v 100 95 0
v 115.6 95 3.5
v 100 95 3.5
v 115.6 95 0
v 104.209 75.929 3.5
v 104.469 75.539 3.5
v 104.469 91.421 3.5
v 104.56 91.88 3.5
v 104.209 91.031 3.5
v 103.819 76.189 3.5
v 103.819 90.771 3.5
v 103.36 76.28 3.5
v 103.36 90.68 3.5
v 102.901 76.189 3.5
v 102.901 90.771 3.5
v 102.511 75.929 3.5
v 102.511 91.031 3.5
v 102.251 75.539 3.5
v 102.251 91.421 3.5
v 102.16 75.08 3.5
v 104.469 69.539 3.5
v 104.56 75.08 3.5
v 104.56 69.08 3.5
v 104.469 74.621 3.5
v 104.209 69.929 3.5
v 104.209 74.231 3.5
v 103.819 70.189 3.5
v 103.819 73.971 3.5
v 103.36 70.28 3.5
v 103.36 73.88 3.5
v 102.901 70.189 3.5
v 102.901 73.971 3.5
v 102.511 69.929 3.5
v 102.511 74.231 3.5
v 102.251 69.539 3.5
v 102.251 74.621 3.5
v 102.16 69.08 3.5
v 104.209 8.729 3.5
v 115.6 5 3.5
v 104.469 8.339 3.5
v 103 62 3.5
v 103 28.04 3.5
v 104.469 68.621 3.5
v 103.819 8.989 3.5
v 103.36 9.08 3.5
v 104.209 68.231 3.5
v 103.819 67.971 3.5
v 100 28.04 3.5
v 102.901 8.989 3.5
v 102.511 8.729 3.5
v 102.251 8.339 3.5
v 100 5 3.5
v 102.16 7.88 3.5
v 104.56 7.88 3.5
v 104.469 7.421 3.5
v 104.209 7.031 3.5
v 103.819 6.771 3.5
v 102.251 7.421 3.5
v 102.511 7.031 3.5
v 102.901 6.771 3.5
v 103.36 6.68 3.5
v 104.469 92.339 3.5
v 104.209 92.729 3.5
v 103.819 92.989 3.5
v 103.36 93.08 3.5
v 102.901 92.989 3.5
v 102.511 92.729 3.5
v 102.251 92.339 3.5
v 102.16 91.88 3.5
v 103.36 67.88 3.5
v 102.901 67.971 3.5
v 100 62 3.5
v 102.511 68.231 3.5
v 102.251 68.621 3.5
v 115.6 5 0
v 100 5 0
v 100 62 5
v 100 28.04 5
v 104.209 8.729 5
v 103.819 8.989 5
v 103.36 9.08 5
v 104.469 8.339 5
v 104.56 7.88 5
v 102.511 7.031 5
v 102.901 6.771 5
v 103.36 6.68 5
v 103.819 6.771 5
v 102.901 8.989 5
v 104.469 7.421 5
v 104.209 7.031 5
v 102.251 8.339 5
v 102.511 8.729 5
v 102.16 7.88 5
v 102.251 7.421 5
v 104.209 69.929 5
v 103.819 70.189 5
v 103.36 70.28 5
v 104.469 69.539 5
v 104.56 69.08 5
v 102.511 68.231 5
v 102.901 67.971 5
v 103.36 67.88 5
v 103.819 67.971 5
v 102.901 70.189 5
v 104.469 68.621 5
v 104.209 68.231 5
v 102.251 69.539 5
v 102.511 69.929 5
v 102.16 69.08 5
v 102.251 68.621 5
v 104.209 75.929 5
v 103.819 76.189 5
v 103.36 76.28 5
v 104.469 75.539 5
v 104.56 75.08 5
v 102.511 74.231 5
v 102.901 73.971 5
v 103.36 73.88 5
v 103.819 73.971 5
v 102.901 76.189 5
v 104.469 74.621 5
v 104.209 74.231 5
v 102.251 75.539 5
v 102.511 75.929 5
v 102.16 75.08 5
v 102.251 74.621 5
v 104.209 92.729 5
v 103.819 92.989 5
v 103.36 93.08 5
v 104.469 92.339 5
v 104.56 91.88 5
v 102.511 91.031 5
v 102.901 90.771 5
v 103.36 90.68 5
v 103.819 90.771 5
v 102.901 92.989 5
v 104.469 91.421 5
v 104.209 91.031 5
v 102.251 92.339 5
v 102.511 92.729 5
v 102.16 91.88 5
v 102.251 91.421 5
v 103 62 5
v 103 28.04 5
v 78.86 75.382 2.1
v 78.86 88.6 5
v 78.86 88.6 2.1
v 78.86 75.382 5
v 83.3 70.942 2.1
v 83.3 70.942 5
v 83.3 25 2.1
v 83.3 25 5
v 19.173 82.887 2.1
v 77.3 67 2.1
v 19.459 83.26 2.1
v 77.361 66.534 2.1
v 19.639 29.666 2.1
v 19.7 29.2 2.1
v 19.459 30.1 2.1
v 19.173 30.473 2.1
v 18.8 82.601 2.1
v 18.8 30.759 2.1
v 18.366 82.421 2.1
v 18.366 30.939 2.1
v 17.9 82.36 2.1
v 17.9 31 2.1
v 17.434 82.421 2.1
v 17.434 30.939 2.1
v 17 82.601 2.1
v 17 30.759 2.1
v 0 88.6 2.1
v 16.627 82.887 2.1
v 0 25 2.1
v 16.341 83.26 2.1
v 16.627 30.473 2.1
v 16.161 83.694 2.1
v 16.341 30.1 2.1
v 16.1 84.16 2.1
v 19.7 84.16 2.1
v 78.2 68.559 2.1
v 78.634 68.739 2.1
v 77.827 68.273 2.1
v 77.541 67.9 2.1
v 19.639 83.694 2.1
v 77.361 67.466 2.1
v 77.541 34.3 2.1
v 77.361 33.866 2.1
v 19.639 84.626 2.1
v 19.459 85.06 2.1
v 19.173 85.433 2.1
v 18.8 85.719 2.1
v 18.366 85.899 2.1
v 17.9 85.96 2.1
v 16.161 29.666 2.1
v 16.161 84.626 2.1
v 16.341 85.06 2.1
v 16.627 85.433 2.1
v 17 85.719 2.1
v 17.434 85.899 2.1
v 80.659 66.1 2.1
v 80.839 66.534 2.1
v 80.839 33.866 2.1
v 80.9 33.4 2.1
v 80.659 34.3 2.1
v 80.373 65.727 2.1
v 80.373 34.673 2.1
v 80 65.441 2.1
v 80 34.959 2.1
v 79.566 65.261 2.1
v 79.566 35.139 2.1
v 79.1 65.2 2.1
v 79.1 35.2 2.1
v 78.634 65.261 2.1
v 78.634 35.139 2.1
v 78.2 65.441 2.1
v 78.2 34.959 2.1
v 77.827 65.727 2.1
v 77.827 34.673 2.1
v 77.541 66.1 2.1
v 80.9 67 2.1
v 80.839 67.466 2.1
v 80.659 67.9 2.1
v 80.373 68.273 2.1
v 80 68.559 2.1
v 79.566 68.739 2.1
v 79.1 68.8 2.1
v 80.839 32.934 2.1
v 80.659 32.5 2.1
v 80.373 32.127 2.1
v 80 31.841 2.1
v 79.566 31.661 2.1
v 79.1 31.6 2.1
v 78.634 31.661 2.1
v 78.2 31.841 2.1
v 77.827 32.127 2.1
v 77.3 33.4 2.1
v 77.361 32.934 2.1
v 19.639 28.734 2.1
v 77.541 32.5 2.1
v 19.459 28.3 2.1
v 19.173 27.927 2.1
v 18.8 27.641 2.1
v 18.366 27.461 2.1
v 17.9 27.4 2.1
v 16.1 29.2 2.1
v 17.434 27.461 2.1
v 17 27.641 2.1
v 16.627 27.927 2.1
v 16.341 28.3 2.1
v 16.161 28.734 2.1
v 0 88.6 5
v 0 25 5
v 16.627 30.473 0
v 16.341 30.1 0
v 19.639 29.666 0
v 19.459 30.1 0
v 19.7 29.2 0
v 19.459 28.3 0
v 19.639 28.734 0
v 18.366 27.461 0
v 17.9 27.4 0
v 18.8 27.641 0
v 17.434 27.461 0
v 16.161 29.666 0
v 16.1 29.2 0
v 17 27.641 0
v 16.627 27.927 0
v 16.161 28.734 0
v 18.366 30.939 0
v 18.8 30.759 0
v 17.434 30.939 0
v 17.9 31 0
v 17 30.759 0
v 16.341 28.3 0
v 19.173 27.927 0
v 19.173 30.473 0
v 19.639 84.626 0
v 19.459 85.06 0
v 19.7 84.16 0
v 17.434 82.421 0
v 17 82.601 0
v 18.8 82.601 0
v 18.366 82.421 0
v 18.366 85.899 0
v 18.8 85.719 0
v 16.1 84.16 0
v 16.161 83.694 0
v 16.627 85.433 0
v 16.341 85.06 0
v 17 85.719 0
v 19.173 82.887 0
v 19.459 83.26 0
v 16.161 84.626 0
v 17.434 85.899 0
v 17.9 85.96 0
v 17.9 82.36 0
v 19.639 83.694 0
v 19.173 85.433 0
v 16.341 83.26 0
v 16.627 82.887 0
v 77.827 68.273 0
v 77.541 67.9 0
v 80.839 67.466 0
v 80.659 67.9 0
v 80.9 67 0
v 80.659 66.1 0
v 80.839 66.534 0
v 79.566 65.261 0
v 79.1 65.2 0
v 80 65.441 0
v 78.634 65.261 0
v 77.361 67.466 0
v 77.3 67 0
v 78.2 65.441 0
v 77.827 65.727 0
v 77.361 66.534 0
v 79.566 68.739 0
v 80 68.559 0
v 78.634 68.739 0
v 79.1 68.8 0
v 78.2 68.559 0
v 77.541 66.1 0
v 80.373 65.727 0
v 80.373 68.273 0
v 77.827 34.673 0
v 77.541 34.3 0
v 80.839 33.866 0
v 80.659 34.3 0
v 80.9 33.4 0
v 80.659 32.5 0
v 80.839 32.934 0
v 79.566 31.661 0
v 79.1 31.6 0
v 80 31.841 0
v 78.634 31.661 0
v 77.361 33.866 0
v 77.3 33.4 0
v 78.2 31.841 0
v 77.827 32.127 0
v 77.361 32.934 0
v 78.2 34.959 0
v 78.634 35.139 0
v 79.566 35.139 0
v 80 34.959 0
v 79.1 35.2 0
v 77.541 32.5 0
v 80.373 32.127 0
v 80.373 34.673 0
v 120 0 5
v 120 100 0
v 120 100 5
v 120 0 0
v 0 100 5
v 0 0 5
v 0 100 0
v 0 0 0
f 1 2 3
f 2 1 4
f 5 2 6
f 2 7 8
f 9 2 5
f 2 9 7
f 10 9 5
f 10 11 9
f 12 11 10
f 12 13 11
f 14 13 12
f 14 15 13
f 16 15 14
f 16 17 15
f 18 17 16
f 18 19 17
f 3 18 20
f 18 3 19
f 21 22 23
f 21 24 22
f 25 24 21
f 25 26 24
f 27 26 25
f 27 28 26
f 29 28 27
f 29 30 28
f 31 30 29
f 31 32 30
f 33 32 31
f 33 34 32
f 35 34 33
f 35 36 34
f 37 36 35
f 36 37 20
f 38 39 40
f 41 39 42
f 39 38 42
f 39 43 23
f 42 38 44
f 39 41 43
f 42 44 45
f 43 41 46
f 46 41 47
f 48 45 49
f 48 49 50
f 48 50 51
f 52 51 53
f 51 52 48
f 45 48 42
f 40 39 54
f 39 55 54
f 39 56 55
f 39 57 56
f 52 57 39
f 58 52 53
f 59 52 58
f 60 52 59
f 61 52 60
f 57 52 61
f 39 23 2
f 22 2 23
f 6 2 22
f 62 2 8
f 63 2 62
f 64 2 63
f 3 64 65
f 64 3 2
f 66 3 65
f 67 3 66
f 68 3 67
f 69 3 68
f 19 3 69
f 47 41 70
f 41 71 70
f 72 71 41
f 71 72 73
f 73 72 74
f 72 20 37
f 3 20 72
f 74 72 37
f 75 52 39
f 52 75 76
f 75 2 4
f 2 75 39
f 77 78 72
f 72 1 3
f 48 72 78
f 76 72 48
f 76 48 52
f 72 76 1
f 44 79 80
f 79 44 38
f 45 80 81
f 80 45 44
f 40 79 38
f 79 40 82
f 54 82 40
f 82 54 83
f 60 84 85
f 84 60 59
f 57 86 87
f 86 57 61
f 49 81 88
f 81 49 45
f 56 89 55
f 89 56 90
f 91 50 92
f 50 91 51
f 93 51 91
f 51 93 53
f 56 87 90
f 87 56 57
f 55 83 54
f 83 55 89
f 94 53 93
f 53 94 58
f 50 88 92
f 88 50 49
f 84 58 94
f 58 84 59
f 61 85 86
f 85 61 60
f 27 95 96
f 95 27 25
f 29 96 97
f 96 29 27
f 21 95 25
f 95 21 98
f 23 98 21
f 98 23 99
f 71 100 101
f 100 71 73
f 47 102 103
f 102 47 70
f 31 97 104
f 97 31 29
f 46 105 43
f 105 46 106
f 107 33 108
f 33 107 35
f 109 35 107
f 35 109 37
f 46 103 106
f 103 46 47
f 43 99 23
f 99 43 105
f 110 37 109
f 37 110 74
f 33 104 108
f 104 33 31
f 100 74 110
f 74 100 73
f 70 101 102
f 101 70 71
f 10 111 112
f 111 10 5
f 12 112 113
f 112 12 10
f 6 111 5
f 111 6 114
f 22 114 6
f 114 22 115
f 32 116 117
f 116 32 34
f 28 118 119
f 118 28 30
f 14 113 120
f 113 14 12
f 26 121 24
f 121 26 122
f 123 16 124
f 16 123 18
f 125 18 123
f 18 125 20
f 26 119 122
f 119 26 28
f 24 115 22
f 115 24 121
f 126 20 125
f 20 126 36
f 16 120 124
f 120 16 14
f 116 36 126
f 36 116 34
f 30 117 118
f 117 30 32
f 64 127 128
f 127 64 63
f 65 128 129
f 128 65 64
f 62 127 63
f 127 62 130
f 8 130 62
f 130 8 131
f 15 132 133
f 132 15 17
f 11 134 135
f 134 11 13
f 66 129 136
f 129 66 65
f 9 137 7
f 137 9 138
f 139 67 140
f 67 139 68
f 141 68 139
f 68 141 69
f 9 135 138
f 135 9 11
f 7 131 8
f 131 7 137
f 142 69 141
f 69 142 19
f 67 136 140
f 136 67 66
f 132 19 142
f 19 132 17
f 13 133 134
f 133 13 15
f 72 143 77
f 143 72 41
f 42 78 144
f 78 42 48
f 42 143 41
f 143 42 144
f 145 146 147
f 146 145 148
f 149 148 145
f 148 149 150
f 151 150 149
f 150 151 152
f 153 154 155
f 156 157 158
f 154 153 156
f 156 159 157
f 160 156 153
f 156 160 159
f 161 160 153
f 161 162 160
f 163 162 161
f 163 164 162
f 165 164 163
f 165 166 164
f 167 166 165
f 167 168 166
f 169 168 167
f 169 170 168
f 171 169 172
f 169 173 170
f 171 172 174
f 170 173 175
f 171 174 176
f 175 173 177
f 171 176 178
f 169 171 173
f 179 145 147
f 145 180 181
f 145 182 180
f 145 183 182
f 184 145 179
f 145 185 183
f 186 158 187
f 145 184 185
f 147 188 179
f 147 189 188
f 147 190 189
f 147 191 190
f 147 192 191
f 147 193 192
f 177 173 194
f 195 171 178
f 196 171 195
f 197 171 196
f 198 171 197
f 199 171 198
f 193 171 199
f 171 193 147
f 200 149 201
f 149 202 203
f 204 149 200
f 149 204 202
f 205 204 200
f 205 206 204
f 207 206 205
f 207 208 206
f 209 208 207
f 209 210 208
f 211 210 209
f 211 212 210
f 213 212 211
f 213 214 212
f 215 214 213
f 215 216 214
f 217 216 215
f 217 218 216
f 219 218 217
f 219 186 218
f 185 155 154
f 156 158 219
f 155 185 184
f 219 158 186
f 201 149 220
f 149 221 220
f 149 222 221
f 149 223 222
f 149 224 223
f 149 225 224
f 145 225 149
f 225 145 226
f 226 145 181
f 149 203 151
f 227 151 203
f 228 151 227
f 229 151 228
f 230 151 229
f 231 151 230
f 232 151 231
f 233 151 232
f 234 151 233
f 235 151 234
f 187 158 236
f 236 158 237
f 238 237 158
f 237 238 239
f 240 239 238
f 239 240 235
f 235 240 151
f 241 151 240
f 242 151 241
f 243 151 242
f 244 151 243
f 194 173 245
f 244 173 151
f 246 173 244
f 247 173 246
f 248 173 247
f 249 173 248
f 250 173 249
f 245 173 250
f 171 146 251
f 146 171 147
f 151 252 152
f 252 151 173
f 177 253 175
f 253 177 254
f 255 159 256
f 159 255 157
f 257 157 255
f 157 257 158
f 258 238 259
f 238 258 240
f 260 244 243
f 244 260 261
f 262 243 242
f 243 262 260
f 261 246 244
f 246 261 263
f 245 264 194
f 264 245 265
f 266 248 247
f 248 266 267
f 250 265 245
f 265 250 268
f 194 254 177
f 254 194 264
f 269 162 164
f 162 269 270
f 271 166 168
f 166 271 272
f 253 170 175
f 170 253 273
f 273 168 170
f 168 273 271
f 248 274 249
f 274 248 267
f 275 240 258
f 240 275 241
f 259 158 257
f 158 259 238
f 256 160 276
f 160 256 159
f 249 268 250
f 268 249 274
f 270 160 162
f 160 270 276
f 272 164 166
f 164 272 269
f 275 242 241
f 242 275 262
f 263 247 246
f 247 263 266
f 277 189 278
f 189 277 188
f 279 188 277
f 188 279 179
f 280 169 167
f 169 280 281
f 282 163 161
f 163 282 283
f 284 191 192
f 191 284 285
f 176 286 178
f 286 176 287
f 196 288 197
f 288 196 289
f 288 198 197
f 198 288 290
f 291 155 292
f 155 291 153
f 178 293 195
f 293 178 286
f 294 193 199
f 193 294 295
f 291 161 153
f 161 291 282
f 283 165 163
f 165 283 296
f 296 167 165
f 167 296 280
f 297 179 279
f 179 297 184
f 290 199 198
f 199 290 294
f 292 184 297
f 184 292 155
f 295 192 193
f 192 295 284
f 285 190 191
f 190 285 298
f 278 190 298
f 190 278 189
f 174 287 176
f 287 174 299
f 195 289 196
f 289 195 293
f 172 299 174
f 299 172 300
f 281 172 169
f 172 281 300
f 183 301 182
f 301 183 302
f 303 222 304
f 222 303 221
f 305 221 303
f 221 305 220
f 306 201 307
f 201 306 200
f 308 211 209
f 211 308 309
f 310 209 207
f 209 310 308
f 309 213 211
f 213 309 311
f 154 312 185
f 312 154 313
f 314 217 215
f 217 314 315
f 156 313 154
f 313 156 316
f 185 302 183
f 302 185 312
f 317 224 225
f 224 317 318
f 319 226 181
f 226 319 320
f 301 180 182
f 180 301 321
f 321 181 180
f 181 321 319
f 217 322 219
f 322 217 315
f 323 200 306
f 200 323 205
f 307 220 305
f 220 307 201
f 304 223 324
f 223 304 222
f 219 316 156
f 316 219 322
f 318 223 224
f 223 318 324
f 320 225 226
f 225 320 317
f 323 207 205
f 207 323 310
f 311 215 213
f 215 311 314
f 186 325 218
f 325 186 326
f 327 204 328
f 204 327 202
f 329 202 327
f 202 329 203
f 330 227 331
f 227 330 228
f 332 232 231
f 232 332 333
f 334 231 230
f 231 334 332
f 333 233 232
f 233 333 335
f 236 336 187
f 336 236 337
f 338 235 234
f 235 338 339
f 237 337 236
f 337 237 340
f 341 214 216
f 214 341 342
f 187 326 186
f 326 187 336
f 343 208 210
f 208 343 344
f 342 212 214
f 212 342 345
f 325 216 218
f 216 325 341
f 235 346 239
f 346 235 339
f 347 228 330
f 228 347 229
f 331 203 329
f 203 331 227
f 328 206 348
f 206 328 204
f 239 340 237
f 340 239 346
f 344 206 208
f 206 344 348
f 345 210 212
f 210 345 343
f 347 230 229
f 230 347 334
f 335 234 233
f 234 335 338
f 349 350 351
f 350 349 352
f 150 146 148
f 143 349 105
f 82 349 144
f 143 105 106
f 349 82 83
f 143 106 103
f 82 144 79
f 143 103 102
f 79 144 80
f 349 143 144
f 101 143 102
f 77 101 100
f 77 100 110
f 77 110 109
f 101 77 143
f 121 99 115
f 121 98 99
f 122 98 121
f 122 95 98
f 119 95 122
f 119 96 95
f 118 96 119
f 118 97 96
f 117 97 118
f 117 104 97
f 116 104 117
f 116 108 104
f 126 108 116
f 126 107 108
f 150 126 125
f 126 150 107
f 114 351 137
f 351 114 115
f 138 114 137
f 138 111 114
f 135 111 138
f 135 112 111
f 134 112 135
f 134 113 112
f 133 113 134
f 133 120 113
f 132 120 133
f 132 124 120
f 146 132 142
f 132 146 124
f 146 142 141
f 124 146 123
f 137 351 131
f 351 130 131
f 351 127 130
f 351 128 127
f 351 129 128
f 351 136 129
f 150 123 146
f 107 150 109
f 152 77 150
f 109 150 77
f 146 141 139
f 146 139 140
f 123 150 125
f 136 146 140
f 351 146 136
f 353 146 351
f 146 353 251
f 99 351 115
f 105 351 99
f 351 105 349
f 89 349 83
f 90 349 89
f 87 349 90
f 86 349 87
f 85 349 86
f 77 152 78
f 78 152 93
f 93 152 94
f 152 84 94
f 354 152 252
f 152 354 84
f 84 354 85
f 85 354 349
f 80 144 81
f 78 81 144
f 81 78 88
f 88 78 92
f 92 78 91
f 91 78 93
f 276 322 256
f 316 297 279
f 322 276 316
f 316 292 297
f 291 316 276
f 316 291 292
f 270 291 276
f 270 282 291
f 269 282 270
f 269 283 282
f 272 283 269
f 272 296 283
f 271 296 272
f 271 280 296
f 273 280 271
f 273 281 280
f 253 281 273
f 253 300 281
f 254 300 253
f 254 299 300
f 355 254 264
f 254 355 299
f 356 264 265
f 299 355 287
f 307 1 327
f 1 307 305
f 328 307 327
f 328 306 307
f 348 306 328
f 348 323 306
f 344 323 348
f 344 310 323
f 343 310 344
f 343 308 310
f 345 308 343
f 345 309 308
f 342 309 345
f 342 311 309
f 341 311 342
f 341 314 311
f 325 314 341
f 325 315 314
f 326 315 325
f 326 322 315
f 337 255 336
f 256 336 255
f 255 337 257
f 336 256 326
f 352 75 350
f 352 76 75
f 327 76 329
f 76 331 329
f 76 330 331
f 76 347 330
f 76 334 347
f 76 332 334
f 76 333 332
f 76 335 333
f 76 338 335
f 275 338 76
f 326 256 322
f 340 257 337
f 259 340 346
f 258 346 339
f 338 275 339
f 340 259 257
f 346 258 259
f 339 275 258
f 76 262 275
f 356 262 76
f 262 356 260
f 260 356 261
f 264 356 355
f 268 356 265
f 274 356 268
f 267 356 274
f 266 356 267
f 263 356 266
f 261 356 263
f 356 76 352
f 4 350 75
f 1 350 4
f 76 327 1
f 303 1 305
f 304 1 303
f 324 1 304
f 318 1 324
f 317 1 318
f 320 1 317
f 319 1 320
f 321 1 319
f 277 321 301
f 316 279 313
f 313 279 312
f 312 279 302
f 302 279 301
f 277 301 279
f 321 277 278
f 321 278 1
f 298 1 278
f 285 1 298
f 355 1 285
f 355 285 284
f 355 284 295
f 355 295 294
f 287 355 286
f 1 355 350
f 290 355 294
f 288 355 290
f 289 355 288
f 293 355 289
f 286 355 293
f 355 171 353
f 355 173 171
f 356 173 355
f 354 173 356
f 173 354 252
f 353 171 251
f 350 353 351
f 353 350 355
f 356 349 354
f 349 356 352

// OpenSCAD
// file: ../Arduino/arduino_uno.scad
board_lenght = 53;
board_wide = 69.5;
board_thick = 1.7;

screw_hole_r = 1.5;

module screw_hole() {
	cylinder(h = 3, r = screw_hole_r);
}

module arduino_uno_board() {
	union() {

		// Circuit board
		color("SteelBlue")
			difference() {
				cube([board_wide, board_lenght, board_thick]); // Base board
				
				// Small hole top right
				translate([65.8, 37.5, -0.5])
					difference() { 
						cube([5, 20.5, 2.5]);

						translate([0, -4, -0.5])
							rotate([0, 0, 45])
								cube(6);
					}

				// Arduino label
				translate([board_wide / 3, board_lenght / 1.5, board_thick])
					text("ARDUINO UNO", board_lenght / 15, "Console");
			}

		// Remove the screw holes
		translate([15, 3.5, -2])
			screw_hole();
		translate([15, 49.3, -2])
			screw_hole();
		translate([66, 35, -2])
			screw_hole();
		translate([66, 7, -2])
			screw_hole();
		

		// USB A port
		color("Silver")
			translate([-6, 32.2, board_thick-0.1])
				cube([16.4, 12, 10.7]);
		
		// Power supply
		color("black")
			translate([-2, 3, 0.1])
				cube([13.5, 9, 12.5]);
	}
}
// file: array_led_QTR-8RC_pololu.scad
module tornillo_m2() {
    cylinder(r=1, h=5);
}

module array_led_sensor() {
    union() {
        color("FireBrick")
            cube([75, 13, 1.6]);

        translate([1 + 1.4, 1 + 1.8, -1.5])
            tornillo_m2();

        translate([1 + 52.4, 1 + 1.8, -1.5])
            tornillo_m2();

        translate([1 + 57.4, 1 + 1.8, -1.5])
            tornillo_m2();

        translate([1 + 71.4, 1 + 1.8, -1.5])
            tornillo_m2();

        translate([47.5 - 28.3, 0, -1 * (11 - 1.7)])
            color("DarkSlateGray")
                cube([28.3, 2.5, 11 - 1.6]);
    }
}
// main file
include <array_led_QTR-8RC_pololu.scad>
include <../Arduino/arduino_uno.scad>

$fa = 1;
$fs = 0.4;

difference() {
    cube(size=[120, 100, 5]);

    translate([100, 5, 3.5])
        rotate([0, 180, -90])
            scale([1.2, 1.2, 3])
                array_led_sensor();

    translate([-0.1, 25, 2.1])
        scale([1.2, 1.2, 1.8])
            arduino_uno_board();
}
